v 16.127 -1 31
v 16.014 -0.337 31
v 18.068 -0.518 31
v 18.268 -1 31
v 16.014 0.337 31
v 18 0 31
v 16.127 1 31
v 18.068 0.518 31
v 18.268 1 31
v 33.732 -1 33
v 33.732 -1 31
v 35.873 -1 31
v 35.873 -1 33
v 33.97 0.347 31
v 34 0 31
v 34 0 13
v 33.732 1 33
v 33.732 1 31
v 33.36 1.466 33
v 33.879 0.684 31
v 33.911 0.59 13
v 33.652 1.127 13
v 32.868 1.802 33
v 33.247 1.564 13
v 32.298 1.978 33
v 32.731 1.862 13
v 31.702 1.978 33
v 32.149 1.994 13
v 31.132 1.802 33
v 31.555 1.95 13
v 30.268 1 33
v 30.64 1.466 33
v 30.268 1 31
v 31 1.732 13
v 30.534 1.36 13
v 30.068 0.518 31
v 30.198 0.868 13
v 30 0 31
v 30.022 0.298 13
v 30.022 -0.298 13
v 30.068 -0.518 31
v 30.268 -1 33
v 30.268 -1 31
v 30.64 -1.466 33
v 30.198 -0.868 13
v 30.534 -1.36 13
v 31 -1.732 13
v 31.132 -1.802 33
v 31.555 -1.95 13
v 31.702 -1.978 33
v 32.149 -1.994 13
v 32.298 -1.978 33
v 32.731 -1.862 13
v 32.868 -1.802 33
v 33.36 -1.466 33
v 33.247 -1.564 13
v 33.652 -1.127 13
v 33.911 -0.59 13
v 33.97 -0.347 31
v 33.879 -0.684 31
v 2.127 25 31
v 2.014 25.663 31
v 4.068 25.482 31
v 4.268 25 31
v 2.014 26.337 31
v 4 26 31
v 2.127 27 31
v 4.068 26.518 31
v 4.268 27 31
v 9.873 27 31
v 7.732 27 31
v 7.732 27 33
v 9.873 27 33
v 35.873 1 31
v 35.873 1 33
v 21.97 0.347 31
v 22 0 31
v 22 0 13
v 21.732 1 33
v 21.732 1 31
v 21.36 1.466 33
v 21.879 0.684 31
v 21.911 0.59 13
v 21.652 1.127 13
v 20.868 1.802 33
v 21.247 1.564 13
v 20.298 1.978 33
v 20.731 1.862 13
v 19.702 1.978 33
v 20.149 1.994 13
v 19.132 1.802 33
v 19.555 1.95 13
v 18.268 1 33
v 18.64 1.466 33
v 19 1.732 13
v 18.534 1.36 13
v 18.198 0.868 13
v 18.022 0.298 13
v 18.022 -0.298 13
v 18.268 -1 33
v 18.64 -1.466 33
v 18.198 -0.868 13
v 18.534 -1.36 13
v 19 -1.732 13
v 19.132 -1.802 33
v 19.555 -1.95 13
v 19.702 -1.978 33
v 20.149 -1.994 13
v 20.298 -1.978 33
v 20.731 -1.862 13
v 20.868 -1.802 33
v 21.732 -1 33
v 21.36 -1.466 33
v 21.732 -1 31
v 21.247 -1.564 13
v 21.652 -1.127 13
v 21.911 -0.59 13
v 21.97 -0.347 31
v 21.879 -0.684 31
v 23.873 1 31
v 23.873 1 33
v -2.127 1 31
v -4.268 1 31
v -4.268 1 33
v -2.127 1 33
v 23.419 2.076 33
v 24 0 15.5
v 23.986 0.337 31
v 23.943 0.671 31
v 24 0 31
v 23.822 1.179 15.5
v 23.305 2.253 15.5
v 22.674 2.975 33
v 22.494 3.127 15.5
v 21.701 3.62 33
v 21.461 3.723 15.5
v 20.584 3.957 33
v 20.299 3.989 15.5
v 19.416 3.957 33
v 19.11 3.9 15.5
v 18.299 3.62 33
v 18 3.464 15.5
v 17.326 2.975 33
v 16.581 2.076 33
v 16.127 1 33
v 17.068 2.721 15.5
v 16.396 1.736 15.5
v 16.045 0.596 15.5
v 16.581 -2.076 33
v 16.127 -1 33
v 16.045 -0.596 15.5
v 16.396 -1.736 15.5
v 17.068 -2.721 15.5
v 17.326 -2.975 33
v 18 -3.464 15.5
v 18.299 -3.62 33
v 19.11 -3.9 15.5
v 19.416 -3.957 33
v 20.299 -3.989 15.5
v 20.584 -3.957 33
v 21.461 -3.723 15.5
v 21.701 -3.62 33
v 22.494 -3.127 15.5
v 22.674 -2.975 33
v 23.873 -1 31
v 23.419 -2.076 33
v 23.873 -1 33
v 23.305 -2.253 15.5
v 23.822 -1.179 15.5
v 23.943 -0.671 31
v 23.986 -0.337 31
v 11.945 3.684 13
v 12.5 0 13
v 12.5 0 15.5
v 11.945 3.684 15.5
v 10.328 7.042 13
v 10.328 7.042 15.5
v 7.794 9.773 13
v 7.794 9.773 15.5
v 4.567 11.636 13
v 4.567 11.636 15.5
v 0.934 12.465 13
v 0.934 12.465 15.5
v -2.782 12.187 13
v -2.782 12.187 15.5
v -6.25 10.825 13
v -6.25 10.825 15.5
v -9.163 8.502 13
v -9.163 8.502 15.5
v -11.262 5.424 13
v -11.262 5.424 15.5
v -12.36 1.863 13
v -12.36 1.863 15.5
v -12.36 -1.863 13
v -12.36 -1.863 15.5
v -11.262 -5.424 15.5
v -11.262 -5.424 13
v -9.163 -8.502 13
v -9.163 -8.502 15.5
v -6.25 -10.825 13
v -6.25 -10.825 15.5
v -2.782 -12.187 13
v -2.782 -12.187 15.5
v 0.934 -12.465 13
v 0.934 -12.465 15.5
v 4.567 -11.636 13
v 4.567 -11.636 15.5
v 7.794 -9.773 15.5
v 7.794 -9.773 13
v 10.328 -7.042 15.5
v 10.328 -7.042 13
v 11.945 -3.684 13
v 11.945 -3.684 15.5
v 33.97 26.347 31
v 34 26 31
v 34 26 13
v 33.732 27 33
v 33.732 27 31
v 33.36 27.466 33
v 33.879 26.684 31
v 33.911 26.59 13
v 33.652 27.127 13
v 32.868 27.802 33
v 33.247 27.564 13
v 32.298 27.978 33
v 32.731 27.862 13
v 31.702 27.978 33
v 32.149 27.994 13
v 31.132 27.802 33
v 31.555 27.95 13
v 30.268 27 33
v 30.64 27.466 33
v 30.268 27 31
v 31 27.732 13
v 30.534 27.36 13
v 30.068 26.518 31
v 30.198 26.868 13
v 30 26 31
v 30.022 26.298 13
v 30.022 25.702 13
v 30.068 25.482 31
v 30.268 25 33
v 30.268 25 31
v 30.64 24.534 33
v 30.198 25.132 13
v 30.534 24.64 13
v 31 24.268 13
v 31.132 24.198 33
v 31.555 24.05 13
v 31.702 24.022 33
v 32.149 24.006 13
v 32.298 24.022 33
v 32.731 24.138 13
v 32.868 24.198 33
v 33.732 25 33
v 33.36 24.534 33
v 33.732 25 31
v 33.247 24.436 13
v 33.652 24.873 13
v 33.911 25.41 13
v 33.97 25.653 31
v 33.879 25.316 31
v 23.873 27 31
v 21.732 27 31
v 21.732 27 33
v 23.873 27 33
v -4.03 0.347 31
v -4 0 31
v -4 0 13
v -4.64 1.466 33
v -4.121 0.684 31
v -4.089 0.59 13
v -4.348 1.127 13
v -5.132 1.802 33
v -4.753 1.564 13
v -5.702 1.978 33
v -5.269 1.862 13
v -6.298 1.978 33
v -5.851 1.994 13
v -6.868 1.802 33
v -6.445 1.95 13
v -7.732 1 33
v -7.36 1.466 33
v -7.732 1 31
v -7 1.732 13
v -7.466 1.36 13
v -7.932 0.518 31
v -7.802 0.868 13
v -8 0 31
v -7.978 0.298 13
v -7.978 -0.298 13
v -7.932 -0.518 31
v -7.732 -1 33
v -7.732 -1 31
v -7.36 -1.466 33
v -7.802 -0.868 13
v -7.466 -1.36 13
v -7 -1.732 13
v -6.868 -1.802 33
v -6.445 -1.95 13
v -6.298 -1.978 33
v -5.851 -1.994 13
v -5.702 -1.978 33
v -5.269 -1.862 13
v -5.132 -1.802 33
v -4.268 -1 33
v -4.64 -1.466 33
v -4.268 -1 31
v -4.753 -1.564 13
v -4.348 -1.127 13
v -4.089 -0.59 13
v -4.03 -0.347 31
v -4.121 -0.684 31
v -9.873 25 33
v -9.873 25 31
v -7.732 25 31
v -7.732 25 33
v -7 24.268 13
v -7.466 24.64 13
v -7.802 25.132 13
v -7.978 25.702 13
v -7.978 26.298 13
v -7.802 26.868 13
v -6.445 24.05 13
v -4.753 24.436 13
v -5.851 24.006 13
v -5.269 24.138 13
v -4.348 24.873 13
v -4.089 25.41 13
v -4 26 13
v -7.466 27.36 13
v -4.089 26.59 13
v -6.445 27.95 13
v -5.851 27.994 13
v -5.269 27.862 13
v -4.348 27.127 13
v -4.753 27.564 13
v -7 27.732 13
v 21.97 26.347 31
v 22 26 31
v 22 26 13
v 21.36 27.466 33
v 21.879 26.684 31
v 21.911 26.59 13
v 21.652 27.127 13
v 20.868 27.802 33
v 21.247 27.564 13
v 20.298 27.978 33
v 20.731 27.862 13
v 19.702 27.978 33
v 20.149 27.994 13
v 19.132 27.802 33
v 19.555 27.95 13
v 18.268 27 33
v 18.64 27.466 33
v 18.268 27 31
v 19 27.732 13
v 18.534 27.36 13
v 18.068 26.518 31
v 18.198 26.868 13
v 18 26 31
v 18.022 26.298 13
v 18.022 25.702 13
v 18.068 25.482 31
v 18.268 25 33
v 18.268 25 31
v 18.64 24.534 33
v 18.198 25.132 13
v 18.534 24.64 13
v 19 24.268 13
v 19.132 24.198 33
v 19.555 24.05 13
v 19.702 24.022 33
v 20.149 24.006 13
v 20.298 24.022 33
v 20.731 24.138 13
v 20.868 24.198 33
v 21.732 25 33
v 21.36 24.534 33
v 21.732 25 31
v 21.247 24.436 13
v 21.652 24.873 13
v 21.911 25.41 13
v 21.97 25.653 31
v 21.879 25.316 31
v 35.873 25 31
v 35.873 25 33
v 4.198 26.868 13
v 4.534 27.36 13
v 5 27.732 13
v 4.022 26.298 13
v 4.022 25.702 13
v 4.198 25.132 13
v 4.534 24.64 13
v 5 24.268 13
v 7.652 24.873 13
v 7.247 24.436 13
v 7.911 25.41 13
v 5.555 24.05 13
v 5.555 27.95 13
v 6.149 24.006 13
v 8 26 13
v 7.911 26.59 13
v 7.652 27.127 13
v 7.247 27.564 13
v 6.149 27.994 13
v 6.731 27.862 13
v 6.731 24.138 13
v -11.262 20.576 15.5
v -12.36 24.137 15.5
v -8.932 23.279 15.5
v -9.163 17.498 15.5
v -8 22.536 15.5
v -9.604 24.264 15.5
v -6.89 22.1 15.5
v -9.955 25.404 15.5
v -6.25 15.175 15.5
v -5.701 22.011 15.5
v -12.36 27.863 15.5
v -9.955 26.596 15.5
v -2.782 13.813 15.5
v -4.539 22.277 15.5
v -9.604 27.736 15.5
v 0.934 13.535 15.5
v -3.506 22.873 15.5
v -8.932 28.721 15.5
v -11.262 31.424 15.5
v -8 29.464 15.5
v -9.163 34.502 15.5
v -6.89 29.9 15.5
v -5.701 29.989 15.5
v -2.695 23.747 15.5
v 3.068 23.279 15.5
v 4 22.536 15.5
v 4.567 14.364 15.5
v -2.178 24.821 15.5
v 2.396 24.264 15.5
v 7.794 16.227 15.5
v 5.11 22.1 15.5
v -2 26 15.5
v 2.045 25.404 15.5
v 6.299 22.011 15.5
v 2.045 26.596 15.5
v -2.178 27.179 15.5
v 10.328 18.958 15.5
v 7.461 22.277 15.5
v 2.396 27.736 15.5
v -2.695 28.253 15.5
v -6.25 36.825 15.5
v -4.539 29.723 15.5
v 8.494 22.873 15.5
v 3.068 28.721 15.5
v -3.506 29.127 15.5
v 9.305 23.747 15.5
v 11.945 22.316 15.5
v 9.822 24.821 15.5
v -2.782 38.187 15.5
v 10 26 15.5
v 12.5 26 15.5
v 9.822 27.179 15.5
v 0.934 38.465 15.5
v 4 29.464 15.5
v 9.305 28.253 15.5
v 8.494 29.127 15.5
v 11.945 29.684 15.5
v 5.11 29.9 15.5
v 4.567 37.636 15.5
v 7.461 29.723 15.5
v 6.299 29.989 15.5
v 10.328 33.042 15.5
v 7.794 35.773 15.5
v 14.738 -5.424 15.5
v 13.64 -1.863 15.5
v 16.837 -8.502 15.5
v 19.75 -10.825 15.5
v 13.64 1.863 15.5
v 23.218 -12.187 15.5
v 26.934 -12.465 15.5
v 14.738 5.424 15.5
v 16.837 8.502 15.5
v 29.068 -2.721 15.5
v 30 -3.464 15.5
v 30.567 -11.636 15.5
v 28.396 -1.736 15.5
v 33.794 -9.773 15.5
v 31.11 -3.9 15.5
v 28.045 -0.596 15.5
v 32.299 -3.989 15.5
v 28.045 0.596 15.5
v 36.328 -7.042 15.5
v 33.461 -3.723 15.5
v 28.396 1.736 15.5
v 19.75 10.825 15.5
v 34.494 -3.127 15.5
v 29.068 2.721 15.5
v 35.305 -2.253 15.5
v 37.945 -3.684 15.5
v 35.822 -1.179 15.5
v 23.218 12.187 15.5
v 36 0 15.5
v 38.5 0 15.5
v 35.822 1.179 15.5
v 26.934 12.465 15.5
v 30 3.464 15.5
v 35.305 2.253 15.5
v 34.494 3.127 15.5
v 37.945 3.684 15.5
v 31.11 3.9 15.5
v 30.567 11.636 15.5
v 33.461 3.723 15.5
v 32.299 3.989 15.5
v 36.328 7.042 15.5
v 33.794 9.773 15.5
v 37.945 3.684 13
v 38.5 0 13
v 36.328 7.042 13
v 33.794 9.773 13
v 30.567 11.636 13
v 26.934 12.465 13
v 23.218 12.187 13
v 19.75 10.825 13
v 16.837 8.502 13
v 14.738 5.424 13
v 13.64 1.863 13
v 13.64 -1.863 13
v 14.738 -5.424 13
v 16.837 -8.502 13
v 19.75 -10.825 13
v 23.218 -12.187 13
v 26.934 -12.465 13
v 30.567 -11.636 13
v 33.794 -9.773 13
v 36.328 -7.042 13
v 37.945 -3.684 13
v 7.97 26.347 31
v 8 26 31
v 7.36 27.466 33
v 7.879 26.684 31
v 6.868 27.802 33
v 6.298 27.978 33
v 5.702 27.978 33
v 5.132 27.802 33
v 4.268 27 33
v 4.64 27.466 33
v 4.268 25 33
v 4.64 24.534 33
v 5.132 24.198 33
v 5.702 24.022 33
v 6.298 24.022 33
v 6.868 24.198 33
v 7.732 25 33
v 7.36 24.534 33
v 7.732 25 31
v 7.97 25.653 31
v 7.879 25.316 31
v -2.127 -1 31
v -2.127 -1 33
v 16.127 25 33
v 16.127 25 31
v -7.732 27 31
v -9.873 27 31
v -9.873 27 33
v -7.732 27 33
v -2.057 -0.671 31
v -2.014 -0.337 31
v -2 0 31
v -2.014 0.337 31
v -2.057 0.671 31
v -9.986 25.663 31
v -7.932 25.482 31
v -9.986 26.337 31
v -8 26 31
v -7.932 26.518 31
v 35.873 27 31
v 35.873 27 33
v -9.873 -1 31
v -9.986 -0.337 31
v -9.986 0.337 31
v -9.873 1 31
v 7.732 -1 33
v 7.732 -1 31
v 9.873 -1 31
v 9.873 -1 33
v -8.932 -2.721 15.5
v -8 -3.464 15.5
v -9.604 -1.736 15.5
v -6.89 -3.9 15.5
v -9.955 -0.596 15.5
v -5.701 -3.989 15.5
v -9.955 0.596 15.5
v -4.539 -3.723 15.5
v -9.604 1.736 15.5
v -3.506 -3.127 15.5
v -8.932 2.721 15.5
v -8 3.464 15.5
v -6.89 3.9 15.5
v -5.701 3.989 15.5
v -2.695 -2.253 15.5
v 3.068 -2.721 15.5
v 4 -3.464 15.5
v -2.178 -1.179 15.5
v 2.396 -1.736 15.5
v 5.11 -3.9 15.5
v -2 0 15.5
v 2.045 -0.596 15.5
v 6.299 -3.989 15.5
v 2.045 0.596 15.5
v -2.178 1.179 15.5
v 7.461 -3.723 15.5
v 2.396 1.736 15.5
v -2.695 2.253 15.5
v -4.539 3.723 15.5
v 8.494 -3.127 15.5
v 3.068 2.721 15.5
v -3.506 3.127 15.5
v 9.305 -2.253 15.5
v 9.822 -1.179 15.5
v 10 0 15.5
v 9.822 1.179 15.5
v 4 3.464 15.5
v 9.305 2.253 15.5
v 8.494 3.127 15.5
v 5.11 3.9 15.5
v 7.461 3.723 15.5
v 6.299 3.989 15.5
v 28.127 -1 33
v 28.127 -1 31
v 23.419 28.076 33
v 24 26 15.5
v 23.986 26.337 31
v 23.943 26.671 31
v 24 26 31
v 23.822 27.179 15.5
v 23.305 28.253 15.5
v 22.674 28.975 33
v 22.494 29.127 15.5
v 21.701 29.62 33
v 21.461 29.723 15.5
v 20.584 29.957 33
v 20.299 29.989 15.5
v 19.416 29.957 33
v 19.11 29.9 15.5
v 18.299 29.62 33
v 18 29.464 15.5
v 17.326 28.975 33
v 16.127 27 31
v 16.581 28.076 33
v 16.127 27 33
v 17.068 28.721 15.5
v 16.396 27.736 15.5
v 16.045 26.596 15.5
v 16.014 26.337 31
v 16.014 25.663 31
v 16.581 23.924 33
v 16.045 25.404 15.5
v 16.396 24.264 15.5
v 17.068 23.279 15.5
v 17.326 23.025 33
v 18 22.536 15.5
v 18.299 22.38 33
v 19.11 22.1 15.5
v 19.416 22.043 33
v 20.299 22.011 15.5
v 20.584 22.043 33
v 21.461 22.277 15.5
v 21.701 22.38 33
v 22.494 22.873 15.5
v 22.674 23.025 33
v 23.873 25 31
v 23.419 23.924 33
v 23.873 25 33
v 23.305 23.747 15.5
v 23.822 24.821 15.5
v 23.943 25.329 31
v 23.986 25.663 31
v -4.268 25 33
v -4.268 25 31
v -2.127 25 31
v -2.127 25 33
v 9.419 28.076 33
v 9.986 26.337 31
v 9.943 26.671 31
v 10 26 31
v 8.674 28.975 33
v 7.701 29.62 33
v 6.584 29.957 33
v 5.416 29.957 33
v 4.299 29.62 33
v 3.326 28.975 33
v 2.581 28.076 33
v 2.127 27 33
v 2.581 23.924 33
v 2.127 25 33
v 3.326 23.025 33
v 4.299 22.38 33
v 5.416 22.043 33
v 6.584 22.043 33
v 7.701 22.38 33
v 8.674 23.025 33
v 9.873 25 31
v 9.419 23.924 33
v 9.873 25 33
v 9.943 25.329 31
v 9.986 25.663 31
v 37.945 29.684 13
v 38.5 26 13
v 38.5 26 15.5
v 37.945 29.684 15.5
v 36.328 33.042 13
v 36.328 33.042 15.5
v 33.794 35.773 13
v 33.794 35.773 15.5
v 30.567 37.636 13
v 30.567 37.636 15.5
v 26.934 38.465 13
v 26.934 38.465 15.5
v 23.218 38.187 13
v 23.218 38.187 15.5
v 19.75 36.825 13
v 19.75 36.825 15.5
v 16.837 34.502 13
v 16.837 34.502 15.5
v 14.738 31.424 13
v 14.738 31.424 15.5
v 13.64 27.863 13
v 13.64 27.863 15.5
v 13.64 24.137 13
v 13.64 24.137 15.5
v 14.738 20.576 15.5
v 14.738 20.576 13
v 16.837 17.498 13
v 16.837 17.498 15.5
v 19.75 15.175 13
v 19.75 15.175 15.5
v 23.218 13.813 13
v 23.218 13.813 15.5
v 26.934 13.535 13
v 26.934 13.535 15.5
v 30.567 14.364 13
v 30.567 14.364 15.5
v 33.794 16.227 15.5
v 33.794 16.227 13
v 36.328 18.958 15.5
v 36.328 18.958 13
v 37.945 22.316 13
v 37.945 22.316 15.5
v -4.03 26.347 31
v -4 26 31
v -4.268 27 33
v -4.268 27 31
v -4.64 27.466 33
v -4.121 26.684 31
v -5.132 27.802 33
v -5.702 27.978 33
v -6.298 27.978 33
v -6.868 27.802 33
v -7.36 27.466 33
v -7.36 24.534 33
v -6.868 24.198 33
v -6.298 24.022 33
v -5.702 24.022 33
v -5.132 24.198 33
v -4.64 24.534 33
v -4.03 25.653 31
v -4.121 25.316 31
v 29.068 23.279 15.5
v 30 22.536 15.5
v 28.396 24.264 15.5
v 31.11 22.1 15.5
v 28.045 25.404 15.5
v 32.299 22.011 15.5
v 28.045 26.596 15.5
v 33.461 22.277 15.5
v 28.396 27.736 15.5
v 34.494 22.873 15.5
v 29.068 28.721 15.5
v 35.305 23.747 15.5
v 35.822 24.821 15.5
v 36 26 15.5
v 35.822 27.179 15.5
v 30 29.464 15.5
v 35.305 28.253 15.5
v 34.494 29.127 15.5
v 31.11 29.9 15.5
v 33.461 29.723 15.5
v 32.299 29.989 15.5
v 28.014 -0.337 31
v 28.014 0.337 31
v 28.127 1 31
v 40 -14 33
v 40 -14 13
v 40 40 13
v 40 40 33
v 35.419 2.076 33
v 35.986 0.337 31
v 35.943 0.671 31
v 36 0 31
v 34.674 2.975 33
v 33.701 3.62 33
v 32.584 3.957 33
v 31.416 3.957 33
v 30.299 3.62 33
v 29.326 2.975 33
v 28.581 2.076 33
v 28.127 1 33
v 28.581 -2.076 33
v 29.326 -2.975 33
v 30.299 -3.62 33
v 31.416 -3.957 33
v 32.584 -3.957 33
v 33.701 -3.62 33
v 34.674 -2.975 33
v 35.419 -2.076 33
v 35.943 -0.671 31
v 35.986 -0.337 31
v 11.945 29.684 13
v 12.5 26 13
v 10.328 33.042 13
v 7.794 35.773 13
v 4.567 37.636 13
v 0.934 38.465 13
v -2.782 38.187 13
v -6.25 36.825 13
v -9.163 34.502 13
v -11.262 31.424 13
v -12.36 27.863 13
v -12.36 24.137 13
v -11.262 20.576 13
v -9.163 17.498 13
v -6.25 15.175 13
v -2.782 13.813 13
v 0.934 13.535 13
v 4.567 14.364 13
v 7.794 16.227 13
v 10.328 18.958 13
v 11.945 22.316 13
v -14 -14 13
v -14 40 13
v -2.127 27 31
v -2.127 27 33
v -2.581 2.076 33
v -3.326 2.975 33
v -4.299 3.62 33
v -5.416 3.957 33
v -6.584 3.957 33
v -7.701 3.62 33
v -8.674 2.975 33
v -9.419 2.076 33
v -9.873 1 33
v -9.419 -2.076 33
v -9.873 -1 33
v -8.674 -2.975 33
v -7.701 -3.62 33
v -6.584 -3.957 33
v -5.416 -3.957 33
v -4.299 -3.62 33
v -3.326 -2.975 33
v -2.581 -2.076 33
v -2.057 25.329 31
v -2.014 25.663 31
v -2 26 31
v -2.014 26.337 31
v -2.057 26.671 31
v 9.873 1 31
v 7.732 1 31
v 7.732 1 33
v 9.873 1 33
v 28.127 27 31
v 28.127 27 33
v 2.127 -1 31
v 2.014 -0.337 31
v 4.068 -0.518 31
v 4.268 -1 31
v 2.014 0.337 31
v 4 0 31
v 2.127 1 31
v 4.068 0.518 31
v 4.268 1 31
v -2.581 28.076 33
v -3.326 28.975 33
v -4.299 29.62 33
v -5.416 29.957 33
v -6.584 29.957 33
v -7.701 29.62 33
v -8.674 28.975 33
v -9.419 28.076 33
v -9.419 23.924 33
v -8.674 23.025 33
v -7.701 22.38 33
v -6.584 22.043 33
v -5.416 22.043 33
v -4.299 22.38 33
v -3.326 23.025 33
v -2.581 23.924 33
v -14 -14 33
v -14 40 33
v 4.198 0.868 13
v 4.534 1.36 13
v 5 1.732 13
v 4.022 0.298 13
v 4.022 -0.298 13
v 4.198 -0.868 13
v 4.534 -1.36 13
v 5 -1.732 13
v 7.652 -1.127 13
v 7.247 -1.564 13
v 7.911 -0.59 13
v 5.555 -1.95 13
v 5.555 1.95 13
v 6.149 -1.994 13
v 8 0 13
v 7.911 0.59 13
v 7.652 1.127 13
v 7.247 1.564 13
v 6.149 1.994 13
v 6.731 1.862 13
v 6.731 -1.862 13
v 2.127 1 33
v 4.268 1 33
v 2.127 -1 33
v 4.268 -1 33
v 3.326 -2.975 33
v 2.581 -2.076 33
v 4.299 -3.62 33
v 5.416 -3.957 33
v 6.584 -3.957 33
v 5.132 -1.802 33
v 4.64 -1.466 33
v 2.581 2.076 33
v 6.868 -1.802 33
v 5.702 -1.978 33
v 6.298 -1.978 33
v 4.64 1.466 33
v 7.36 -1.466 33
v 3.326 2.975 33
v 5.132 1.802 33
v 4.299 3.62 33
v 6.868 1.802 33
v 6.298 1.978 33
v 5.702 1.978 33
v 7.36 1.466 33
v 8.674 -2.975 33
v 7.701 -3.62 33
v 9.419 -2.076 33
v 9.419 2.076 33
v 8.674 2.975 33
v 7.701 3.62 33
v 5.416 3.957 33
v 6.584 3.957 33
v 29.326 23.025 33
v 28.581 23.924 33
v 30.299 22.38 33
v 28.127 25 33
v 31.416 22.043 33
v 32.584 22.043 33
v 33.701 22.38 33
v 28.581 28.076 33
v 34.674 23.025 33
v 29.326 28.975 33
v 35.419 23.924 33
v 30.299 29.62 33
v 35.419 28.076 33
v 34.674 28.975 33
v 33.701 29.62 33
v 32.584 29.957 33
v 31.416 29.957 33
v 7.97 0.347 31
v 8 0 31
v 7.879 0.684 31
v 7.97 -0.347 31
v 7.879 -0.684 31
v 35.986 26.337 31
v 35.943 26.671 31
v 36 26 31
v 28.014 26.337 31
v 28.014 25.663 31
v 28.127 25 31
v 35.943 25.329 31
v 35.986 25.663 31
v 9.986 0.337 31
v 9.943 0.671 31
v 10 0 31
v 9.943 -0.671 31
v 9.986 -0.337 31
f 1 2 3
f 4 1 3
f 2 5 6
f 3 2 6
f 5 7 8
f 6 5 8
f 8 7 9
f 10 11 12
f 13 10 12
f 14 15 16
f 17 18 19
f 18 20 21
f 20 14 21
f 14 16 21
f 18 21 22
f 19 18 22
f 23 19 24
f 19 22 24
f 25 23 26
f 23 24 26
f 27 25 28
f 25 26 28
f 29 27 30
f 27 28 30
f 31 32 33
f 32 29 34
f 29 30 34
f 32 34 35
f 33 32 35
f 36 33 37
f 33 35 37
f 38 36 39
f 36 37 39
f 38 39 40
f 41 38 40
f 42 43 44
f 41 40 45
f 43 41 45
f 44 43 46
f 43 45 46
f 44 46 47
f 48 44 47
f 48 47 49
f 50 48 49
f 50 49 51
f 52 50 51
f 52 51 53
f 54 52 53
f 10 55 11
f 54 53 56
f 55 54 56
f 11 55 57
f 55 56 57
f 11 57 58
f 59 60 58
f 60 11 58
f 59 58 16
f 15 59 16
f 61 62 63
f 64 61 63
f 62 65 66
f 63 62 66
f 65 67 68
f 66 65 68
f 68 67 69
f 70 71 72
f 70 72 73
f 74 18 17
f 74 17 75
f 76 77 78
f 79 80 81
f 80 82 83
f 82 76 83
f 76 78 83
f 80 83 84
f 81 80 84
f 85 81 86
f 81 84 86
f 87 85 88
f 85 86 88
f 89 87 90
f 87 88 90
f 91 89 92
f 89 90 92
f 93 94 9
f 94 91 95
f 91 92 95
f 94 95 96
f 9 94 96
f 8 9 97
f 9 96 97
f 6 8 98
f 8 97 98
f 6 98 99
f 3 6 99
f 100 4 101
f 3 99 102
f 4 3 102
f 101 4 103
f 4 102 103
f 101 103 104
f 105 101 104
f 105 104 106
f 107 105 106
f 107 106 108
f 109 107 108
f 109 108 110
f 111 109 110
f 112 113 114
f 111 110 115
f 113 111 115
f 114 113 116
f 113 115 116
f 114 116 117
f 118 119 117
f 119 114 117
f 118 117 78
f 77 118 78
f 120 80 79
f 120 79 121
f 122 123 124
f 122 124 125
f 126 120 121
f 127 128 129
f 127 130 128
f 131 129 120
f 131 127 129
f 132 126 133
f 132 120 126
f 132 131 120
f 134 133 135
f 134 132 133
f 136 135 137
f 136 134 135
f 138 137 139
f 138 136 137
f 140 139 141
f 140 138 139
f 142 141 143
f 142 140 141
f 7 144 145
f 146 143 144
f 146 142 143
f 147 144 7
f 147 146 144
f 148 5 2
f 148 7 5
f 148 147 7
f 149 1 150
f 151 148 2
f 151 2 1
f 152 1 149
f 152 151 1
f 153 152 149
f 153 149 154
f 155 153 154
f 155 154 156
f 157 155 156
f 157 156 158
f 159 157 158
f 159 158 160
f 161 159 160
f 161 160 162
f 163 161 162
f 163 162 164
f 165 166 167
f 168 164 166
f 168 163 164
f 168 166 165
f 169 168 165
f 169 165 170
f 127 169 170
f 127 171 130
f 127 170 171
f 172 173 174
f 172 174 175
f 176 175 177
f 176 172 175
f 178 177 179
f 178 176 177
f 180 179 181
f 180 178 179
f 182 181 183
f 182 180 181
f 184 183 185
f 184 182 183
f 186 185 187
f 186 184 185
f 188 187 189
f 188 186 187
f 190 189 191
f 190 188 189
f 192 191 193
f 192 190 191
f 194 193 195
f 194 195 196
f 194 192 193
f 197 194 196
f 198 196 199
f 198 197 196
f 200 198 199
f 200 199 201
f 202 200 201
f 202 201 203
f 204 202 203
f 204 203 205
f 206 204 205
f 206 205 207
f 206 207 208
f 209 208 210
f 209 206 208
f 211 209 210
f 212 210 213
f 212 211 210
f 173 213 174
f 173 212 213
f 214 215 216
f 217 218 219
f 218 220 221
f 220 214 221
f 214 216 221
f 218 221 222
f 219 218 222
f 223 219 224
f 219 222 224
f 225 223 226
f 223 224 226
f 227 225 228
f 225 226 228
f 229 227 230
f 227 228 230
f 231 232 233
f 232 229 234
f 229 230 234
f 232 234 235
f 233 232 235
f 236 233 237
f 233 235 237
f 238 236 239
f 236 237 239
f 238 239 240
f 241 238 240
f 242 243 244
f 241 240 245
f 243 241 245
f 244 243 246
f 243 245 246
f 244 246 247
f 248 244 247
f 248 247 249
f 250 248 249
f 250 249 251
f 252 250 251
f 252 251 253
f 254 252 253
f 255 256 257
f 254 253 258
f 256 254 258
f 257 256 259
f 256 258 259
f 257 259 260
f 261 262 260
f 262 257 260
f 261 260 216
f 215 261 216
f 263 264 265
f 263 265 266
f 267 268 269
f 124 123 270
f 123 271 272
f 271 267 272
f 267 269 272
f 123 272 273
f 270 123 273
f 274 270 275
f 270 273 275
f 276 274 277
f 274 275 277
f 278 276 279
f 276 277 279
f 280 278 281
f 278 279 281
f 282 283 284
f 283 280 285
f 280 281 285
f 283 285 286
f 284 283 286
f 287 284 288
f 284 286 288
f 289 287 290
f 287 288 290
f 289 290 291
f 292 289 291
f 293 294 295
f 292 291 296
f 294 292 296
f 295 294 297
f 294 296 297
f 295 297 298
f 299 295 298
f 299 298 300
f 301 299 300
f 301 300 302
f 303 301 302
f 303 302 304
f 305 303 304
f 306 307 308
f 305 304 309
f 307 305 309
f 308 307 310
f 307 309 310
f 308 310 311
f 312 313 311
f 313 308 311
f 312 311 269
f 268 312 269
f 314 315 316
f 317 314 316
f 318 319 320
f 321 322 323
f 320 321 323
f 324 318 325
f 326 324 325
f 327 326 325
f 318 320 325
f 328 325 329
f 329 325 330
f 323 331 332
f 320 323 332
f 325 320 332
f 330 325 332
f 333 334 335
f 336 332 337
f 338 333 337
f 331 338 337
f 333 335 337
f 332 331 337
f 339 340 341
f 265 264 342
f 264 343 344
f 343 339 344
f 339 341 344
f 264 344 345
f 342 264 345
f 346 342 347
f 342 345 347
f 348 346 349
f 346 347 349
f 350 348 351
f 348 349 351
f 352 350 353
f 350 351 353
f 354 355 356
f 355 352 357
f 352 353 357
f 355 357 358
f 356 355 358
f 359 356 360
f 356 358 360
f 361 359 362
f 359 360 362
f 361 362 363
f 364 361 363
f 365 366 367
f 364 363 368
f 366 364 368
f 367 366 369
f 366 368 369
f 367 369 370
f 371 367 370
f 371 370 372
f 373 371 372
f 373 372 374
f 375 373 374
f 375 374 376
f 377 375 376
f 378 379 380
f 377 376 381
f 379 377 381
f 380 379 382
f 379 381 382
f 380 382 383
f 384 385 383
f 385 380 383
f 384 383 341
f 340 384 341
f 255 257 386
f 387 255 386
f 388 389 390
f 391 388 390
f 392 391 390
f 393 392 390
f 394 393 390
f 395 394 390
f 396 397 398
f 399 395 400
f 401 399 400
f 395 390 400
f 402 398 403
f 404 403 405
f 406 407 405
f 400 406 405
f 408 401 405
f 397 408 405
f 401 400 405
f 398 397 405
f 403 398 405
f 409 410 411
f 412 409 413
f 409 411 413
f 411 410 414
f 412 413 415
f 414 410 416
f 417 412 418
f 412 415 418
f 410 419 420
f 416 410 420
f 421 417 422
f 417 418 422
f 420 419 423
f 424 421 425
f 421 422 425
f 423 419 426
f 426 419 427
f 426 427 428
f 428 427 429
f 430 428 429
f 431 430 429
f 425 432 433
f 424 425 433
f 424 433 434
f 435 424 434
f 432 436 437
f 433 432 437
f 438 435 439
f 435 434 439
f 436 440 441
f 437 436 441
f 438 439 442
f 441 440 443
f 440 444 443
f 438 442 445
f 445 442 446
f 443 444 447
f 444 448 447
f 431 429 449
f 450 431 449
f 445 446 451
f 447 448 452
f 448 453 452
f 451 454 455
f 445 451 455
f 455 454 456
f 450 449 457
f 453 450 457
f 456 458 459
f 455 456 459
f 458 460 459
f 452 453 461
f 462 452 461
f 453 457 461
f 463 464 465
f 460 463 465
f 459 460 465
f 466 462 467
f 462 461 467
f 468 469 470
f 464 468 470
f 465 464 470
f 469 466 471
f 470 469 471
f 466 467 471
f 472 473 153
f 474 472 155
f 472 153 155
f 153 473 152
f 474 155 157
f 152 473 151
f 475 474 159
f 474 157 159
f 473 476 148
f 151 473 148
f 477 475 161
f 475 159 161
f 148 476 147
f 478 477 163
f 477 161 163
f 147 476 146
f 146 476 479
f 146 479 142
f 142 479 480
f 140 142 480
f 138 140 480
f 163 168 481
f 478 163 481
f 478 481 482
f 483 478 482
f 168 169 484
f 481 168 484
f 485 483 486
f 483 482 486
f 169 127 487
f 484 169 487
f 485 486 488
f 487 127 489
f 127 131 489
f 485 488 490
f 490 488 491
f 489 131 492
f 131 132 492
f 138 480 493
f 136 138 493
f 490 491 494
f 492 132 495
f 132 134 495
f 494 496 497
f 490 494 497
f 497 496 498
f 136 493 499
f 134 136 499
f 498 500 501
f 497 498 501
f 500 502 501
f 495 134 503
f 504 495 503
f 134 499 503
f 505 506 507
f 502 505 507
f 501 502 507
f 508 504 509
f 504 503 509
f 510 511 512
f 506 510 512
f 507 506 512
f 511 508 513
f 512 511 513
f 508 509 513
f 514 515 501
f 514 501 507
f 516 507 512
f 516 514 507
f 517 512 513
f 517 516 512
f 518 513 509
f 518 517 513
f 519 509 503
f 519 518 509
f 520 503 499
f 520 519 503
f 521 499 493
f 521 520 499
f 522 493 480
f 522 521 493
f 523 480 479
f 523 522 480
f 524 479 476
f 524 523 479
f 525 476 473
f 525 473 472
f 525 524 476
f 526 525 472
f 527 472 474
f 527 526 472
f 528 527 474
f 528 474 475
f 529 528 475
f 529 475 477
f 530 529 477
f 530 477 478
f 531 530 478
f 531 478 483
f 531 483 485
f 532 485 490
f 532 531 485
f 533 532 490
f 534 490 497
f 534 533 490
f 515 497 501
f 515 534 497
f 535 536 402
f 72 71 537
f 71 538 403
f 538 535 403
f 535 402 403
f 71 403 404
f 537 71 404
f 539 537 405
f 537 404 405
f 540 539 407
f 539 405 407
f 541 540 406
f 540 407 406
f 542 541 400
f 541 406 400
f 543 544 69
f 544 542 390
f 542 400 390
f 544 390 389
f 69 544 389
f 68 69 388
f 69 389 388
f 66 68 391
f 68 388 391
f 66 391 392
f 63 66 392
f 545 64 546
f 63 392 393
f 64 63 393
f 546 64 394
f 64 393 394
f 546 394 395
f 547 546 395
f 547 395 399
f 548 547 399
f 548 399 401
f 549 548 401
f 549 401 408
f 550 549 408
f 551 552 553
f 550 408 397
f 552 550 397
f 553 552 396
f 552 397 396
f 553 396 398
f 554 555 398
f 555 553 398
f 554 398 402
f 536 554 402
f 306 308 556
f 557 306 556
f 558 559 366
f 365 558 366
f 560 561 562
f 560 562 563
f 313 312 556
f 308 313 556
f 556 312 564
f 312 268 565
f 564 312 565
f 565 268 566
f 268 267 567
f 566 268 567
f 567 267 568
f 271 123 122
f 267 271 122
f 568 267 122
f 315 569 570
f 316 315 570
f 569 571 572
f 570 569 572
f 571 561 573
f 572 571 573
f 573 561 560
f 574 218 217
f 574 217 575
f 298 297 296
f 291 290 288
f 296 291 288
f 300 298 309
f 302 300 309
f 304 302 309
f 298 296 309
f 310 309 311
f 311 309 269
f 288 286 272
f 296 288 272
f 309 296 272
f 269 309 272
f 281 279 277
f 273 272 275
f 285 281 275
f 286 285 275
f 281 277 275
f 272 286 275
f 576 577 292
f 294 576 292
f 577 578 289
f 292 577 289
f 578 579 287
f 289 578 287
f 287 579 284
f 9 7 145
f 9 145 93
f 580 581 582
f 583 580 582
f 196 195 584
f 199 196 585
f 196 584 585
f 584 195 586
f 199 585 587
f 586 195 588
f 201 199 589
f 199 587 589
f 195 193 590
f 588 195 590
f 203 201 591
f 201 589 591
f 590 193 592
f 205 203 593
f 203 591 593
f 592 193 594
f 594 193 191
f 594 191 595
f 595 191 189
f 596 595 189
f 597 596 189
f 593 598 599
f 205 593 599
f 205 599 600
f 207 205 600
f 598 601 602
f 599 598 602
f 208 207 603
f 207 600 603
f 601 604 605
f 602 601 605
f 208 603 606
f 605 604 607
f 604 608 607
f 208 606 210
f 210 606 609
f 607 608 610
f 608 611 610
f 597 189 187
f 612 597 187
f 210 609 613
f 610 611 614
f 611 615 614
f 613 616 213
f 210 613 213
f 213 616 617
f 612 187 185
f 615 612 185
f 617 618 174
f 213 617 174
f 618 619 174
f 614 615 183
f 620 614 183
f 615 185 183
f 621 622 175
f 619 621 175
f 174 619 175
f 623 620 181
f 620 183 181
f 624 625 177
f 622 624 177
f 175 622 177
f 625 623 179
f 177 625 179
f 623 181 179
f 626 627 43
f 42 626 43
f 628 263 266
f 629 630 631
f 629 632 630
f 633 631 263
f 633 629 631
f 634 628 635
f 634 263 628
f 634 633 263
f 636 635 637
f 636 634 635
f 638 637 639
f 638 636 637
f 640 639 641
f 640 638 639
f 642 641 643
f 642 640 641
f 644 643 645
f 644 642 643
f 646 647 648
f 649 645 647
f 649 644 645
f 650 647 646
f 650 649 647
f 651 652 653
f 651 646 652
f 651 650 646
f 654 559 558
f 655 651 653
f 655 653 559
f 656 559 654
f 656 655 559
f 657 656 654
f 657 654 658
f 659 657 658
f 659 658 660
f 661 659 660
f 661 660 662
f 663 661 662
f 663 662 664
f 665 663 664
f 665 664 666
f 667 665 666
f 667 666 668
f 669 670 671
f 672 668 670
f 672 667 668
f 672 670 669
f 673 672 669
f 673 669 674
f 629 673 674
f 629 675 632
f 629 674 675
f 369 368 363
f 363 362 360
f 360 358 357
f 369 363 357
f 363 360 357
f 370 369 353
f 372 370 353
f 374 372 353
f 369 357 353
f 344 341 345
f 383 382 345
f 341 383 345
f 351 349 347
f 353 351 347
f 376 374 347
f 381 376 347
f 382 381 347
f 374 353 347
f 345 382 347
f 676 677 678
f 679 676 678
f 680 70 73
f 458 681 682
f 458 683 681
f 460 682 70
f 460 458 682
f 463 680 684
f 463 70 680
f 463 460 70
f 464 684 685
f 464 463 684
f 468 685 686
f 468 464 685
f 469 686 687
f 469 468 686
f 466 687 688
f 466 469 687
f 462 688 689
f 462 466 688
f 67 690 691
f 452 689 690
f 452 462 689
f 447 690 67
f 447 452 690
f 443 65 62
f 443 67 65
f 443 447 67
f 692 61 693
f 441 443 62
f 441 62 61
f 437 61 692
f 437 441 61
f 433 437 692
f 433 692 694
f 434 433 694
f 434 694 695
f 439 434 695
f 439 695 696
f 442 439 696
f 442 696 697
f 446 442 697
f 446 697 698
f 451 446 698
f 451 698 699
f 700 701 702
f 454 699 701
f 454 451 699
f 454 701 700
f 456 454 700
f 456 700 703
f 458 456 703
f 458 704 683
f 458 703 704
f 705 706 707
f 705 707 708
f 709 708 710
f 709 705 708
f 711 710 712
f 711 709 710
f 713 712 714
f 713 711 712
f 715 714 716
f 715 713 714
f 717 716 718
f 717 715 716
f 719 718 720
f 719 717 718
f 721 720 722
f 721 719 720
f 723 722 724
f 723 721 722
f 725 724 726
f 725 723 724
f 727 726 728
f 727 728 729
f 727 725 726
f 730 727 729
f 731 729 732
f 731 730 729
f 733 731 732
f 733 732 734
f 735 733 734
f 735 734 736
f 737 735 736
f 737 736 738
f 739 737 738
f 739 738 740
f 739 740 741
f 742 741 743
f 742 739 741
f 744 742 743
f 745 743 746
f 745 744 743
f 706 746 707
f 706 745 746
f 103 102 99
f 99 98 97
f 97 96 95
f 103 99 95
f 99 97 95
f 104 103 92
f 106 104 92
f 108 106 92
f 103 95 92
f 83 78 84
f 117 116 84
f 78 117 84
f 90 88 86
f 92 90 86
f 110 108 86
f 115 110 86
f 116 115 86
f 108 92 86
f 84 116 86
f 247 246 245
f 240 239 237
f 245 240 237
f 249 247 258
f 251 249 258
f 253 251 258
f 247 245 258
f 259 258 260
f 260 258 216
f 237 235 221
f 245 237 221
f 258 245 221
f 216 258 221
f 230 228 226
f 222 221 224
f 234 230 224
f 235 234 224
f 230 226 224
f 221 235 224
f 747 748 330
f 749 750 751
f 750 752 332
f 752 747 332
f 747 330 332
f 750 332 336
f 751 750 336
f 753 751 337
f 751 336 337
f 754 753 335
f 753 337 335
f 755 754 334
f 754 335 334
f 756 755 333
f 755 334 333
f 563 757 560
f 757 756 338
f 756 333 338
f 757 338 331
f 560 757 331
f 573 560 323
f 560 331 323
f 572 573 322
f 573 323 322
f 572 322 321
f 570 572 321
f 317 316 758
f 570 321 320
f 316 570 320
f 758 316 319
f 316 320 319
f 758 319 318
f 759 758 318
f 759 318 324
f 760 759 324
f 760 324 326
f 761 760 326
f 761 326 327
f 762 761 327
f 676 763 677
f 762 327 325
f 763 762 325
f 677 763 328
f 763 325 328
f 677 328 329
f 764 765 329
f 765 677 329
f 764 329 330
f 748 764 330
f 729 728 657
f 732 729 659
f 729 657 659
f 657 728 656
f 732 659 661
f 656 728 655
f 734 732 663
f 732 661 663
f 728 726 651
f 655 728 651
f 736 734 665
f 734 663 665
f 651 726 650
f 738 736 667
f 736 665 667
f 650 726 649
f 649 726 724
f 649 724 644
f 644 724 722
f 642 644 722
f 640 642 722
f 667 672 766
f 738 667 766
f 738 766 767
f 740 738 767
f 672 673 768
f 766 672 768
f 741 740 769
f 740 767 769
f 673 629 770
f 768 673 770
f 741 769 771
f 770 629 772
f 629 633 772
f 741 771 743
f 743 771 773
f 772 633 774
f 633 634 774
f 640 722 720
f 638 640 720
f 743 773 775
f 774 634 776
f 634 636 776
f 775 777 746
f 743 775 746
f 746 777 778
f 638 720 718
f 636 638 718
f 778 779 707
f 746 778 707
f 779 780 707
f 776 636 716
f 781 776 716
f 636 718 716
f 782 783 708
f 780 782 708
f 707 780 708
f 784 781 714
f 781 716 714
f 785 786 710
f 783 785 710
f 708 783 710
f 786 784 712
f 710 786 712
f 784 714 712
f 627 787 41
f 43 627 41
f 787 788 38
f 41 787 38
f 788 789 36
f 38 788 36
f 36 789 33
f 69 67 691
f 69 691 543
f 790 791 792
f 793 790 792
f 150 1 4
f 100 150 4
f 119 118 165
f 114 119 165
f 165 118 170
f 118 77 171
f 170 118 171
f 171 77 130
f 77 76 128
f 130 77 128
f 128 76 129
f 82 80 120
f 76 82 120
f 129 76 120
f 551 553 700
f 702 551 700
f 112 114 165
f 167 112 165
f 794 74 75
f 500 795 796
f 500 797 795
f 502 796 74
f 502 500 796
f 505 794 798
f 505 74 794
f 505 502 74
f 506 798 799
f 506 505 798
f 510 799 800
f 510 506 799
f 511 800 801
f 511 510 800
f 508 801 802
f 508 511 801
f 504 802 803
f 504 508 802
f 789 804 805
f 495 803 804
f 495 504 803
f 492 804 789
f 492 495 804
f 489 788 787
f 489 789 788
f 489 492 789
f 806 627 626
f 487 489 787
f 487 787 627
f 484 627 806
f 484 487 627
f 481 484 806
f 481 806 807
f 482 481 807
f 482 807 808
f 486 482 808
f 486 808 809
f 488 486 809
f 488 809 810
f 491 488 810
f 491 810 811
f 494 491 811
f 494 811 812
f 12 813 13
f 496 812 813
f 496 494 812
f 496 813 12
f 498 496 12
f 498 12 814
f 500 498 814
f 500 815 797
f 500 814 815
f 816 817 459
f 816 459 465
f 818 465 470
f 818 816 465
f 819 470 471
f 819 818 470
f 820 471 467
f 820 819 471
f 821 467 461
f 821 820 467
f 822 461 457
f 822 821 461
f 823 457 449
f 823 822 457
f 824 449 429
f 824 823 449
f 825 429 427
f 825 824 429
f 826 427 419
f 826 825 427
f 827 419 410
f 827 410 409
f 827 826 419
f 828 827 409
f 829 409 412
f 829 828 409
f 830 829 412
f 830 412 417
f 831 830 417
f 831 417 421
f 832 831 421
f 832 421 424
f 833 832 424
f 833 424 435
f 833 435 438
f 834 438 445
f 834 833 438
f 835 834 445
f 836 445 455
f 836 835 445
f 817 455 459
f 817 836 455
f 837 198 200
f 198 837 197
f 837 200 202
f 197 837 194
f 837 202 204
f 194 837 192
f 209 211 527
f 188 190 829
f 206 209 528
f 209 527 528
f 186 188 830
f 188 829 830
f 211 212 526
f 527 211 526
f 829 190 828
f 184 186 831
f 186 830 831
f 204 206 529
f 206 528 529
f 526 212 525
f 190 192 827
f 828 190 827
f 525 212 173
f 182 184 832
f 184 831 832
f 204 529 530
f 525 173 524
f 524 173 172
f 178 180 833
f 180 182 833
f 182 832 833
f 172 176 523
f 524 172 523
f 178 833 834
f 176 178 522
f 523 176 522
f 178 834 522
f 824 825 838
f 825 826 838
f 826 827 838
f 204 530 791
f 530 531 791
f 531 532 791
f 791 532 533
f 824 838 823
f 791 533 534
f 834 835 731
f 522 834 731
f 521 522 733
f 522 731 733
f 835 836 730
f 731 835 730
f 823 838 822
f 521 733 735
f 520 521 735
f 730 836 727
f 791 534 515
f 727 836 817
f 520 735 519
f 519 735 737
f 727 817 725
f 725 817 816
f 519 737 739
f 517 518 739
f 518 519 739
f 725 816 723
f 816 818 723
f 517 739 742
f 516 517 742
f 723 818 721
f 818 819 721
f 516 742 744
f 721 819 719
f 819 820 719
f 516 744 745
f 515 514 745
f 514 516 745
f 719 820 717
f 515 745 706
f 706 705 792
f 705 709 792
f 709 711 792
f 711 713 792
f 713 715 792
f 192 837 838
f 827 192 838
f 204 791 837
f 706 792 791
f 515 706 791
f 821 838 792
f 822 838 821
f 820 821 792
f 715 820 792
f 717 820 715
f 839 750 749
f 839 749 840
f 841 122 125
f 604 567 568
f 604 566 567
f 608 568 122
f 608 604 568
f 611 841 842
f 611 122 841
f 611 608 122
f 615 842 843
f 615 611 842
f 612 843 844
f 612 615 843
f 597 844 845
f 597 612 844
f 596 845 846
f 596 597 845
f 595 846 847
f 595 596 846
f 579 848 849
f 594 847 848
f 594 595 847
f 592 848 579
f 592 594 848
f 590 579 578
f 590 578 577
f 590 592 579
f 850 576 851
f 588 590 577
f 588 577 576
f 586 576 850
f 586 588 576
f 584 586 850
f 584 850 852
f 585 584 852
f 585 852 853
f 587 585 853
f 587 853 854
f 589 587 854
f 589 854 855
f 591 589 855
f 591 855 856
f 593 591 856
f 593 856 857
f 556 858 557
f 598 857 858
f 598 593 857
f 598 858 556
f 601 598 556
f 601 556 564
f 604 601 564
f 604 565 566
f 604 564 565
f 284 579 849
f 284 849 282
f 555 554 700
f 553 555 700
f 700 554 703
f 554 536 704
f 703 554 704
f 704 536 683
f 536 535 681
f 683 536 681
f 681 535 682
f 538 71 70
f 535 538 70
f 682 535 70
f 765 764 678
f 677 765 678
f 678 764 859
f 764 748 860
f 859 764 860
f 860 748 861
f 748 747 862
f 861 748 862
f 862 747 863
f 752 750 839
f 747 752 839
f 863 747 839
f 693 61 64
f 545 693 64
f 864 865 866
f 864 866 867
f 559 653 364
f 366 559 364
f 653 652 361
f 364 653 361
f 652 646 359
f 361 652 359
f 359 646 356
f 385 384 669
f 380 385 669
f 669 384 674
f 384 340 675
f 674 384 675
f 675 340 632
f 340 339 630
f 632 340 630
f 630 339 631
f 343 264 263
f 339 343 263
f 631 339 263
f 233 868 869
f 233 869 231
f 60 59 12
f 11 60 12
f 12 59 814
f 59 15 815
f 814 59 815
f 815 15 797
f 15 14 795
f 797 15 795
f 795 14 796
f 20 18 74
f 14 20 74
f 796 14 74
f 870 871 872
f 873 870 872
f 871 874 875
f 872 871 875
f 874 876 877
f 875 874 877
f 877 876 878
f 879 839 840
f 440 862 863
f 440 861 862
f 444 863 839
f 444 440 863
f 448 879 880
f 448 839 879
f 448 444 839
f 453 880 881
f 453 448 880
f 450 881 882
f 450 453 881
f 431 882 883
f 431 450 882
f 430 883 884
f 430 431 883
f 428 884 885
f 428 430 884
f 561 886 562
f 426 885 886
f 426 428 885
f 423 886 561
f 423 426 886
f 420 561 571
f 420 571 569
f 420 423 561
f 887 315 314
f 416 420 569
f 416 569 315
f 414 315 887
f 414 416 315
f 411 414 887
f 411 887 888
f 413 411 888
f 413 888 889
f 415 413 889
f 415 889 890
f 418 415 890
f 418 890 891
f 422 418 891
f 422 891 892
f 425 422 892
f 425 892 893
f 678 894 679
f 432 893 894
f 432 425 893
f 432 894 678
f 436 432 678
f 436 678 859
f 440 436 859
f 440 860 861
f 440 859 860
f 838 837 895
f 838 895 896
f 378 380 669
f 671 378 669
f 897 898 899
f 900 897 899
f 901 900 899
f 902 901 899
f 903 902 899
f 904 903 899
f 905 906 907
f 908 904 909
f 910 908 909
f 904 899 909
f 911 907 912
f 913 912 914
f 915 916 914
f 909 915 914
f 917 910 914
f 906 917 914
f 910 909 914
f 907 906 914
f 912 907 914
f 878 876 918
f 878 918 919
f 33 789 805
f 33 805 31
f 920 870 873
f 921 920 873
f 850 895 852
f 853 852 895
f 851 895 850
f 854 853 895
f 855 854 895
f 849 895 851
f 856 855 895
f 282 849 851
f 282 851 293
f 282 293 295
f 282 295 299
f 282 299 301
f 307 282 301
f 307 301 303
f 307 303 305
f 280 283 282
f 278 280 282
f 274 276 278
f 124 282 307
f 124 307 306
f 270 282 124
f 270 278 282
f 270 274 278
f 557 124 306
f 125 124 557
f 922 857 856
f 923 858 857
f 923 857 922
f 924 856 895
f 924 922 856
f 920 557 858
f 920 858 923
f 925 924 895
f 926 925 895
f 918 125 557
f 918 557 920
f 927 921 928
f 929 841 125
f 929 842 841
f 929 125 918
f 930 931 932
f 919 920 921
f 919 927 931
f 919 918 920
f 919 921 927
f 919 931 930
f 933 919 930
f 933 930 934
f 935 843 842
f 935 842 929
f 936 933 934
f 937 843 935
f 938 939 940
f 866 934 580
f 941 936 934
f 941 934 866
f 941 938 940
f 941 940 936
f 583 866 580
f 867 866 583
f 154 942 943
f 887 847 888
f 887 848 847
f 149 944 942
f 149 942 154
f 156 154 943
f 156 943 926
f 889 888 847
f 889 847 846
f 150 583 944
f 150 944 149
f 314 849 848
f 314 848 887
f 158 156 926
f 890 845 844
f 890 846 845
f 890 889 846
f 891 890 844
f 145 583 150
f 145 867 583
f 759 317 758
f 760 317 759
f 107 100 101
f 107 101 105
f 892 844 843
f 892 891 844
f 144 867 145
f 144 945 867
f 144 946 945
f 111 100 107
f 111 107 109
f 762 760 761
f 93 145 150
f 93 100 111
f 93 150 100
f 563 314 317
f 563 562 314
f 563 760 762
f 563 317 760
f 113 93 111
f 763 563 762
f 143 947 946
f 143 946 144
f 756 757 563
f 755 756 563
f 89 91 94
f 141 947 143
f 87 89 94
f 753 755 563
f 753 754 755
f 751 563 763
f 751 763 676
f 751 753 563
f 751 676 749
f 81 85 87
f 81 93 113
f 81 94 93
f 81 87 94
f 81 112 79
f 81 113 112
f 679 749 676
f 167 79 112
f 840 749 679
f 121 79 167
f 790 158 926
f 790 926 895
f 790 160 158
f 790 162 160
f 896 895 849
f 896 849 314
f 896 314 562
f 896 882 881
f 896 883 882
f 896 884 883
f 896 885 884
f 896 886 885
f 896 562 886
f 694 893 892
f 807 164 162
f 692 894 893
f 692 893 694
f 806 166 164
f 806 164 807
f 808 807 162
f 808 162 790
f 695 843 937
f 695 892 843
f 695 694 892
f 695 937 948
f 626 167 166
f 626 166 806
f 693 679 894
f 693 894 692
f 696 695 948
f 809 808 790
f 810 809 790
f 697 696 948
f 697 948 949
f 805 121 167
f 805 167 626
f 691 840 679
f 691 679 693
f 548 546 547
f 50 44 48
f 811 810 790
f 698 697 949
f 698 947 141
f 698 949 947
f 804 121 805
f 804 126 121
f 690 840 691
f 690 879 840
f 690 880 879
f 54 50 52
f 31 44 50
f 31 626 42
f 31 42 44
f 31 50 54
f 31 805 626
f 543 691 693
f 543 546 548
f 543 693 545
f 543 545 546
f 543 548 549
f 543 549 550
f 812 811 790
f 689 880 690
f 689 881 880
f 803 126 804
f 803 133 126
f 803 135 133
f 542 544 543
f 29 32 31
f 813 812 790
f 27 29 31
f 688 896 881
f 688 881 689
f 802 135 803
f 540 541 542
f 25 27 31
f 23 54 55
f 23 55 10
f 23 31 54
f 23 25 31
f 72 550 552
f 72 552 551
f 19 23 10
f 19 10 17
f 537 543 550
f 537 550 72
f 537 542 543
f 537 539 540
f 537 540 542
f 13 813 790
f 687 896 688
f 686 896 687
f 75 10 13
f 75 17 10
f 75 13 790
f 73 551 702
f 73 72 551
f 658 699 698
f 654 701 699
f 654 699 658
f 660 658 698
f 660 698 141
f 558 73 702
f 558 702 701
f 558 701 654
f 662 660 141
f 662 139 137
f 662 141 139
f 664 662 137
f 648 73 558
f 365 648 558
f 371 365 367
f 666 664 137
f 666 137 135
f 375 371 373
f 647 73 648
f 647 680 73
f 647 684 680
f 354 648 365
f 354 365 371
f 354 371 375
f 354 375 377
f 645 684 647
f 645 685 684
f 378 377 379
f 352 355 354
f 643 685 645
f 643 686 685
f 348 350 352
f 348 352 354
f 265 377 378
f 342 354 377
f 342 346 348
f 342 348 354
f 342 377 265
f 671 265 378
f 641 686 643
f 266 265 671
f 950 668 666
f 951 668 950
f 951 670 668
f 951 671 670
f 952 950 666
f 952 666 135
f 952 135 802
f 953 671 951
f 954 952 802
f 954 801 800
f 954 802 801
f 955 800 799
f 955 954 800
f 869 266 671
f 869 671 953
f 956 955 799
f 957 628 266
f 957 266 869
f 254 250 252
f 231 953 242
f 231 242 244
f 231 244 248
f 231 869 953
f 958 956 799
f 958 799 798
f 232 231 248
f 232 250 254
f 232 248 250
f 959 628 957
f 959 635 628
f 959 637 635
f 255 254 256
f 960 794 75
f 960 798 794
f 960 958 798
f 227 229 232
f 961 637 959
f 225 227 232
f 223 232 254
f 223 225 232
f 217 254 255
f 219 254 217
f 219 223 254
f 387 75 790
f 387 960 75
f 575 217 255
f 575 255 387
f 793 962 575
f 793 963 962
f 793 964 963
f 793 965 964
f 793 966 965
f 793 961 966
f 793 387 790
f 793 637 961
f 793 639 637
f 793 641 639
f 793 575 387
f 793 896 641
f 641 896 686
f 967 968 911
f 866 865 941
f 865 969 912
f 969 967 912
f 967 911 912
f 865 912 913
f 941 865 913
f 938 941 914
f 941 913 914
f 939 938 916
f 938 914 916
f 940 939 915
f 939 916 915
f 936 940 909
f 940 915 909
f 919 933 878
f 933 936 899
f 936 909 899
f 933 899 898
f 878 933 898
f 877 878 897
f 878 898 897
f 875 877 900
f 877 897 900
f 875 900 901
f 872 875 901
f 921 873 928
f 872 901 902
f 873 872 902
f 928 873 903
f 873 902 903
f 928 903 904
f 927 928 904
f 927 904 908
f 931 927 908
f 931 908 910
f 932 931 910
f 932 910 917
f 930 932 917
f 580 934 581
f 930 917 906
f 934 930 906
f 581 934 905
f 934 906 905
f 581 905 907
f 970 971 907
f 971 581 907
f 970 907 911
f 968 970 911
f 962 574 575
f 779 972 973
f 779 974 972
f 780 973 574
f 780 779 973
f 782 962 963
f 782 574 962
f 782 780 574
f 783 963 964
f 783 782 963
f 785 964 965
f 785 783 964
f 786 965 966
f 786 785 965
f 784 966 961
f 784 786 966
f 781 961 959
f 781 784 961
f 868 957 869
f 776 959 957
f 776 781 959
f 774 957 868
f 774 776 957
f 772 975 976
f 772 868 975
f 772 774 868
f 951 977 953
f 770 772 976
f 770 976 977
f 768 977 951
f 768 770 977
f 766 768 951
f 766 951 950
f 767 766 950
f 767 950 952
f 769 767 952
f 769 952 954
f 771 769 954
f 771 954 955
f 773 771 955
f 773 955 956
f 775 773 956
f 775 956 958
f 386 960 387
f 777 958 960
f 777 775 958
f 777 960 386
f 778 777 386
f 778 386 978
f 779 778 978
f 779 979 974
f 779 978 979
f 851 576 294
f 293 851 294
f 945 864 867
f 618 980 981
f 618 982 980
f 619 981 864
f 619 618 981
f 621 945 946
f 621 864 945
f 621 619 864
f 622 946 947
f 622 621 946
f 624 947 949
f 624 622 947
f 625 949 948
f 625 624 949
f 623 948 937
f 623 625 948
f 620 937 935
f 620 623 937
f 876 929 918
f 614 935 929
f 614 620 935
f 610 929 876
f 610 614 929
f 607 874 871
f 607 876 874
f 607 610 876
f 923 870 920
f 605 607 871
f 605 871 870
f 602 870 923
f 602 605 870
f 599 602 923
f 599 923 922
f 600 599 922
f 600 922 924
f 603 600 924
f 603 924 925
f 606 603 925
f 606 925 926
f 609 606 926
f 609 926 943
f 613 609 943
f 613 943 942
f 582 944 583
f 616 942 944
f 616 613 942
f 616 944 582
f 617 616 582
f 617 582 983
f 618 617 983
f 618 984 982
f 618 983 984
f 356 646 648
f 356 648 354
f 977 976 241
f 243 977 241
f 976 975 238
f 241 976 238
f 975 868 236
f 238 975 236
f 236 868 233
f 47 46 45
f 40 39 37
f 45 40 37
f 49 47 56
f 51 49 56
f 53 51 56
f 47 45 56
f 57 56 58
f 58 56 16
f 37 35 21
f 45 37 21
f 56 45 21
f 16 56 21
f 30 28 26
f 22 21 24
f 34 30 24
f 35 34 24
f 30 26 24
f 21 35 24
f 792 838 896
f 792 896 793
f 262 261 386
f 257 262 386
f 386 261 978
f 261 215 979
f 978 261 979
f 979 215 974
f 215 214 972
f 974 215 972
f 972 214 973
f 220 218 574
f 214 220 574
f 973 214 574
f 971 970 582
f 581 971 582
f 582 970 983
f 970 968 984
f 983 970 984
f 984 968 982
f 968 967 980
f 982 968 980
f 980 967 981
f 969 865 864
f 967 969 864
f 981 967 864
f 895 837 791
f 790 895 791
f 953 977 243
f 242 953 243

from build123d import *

# Parameters (mm, degrees)
BOX022_W          = 47
BOX022_H          = 2
BOX022_DEPTH      = 2
BOX023_W          = 47
BOX023_H          = 2
BOX023_DEPTH      = 2
CYLINDER026_R     = 2
CYLINDER026_DEPTH = 20
CYLINDER025_R     = 2
CYLINDER025_DEPTH = 20
CYLINDER027_R     = 12.5
CYLINDER027_DEPTH = 2.5
CYLINDER023_R     = 4
CYLINDER023_DEPTH = 20
CYLINDER024_R     = 4
CYLINDER024_DEPTH = 20
BOX021_W          = 54
BOX021_H          = 54
BOX021_DEPTH      = 20


with BuildPart() as cube022:
    # Box022 → Box022 (new body)
    with BuildSketch(Plane(origin=(-10, -1, 31), x_dir=(1, 0, 0), z_dir=(0, 0, 1))):
        with Locations((23.5, 1)):
            Rectangle(BOX022_W, BOX022_H)
    extrude(amount=BOX022_DEPTH)


with BuildPart() as cube023:
    # Box023 → Box023 (new body)
    with BuildSketch(Plane(origin=(-10, 25, 31), x_dir=(1, 0, 0), z_dir=(0, 0, 1))):
        with Locations((23.5, 1)):
            Rectangle(BOX023_W, BOX023_H)
    extrude(amount=BOX023_DEPTH)


with BuildPart() as zylinder026:
    # Cylinder026 → Cylinder026 (new body)
    with BuildSketch(Plane(origin=(6, 0, 13), x_dir=(1, 0, 0), z_dir=(0, 0, 1))):
        Circle(CYLINDER026_R)
    extrude(amount=CYLINDER026_DEPTH)


with BuildPart() as fusion013:
    # Cylinder025 → Cylinder025 (new body)
    with BuildSketch(Plane(origin=(-6, 0, 13), x_dir=(1, 0, 0), z_dir=(0, 0, 1))):
        Circle(CYLINDER025_R)
    extrude(amount=CYLINDER025_DEPTH)

    # Fusion013: union Zylinder026
    add(zylinder026.part)


with BuildPart() as zylinder027:
    # Cylinder027 → Cylinder027 (new body)
    with BuildSketch(Plane.XY.offset(13)):
        Circle(CYLINDER027_R)
    extrude(amount=CYLINDER027_DEPTH)


with BuildPart() as zylinder023:
    # Cylinder023 → Cylinder023 (new body)
    with BuildSketch(Plane(origin=(6, 0, 13), x_dir=(1, 0, 0), z_dir=(0, 0, 1))):
        Circle(CYLINDER023_R)
    extrude(amount=CYLINDER023_DEPTH)


with BuildPart() as fusion014:
    # Cylinder024 → Cylinder024 (new body)
    with BuildSketch(Plane(origin=(-6, 0, 13), x_dir=(1, 0, 0), z_dir=(0, 0, 1))):
        Circle(CYLINDER024_R)
    extrude(amount=CYLINDER024_DEPTH)

    # Fusion012: union Zylinder023
    add(zylinder023.part)

    # Fusion014: union Zylinder027
    add(zylinder027.part)


with BuildPart() as cut016:
    # Cut016 base: copy of Fusion014
    add(fusion014.part)

    # Cut016: cut Fusion013
    add(fusion013.part, mode=Mode.SUBTRACT)


with BuildPart() as cut017:
    # Cut017 base: copy of Fusion014
    add(fusion014.part)

    # Cut017: cut Fusion013
    add(fusion013.part, mode=Mode.SUBTRACT)


with BuildPart() as cut017_1:
    # Cut017 placement: moved
    add(cut017.part.moved(Location((26, 0, 0))))


with BuildPart() as cut015:
    # Cut015 base: copy of Fusion014
    add(fusion014.part)

    # Cut015: cut Fusion013
    add(fusion013.part, mode=Mode.SUBTRACT)


with BuildPart() as cut015_1:
    # Cut015 placement: moved
    add(cut015.part.moved(Location((26, 26, 0))))


with BuildPart() as fusion015:
    # Cut014 base: copy of Fusion014
    add(fusion014.part)

    # Cut014: cut Fusion013
    add(fusion013.part, mode=Mode.SUBTRACT)


with BuildPart() as fusion015_1:
    # Cut014 placement: moved
    add(fusion015.part.moved(Location((0, 26, 0))))

    # Fusion015: union Cut016, Cut017, Cut015
    add(cut016.part)
    add(cut017_1.part)
    add(cut015_1.part)


with BuildPart() as dichtungen:
    # Box021 → Box021 (new body)
    with BuildSketch(Plane(origin=(-14, -14, 13), x_dir=(1, 0, 0), z_dir=(0, 0, 1))):
        with Locations((27, 27)):
            Rectangle(BOX021_W, BOX021_H)
    extrude(amount=BOX021_DEPTH)

    # Cut018: cut Fusion015
    add(fusion015_1.part, mode=Mode.SUBTRACT)

    # Fusion016: union Cube022, Cube023
    add(cube022.part)
    add(cube023.part)


solid = dichtungen.part
